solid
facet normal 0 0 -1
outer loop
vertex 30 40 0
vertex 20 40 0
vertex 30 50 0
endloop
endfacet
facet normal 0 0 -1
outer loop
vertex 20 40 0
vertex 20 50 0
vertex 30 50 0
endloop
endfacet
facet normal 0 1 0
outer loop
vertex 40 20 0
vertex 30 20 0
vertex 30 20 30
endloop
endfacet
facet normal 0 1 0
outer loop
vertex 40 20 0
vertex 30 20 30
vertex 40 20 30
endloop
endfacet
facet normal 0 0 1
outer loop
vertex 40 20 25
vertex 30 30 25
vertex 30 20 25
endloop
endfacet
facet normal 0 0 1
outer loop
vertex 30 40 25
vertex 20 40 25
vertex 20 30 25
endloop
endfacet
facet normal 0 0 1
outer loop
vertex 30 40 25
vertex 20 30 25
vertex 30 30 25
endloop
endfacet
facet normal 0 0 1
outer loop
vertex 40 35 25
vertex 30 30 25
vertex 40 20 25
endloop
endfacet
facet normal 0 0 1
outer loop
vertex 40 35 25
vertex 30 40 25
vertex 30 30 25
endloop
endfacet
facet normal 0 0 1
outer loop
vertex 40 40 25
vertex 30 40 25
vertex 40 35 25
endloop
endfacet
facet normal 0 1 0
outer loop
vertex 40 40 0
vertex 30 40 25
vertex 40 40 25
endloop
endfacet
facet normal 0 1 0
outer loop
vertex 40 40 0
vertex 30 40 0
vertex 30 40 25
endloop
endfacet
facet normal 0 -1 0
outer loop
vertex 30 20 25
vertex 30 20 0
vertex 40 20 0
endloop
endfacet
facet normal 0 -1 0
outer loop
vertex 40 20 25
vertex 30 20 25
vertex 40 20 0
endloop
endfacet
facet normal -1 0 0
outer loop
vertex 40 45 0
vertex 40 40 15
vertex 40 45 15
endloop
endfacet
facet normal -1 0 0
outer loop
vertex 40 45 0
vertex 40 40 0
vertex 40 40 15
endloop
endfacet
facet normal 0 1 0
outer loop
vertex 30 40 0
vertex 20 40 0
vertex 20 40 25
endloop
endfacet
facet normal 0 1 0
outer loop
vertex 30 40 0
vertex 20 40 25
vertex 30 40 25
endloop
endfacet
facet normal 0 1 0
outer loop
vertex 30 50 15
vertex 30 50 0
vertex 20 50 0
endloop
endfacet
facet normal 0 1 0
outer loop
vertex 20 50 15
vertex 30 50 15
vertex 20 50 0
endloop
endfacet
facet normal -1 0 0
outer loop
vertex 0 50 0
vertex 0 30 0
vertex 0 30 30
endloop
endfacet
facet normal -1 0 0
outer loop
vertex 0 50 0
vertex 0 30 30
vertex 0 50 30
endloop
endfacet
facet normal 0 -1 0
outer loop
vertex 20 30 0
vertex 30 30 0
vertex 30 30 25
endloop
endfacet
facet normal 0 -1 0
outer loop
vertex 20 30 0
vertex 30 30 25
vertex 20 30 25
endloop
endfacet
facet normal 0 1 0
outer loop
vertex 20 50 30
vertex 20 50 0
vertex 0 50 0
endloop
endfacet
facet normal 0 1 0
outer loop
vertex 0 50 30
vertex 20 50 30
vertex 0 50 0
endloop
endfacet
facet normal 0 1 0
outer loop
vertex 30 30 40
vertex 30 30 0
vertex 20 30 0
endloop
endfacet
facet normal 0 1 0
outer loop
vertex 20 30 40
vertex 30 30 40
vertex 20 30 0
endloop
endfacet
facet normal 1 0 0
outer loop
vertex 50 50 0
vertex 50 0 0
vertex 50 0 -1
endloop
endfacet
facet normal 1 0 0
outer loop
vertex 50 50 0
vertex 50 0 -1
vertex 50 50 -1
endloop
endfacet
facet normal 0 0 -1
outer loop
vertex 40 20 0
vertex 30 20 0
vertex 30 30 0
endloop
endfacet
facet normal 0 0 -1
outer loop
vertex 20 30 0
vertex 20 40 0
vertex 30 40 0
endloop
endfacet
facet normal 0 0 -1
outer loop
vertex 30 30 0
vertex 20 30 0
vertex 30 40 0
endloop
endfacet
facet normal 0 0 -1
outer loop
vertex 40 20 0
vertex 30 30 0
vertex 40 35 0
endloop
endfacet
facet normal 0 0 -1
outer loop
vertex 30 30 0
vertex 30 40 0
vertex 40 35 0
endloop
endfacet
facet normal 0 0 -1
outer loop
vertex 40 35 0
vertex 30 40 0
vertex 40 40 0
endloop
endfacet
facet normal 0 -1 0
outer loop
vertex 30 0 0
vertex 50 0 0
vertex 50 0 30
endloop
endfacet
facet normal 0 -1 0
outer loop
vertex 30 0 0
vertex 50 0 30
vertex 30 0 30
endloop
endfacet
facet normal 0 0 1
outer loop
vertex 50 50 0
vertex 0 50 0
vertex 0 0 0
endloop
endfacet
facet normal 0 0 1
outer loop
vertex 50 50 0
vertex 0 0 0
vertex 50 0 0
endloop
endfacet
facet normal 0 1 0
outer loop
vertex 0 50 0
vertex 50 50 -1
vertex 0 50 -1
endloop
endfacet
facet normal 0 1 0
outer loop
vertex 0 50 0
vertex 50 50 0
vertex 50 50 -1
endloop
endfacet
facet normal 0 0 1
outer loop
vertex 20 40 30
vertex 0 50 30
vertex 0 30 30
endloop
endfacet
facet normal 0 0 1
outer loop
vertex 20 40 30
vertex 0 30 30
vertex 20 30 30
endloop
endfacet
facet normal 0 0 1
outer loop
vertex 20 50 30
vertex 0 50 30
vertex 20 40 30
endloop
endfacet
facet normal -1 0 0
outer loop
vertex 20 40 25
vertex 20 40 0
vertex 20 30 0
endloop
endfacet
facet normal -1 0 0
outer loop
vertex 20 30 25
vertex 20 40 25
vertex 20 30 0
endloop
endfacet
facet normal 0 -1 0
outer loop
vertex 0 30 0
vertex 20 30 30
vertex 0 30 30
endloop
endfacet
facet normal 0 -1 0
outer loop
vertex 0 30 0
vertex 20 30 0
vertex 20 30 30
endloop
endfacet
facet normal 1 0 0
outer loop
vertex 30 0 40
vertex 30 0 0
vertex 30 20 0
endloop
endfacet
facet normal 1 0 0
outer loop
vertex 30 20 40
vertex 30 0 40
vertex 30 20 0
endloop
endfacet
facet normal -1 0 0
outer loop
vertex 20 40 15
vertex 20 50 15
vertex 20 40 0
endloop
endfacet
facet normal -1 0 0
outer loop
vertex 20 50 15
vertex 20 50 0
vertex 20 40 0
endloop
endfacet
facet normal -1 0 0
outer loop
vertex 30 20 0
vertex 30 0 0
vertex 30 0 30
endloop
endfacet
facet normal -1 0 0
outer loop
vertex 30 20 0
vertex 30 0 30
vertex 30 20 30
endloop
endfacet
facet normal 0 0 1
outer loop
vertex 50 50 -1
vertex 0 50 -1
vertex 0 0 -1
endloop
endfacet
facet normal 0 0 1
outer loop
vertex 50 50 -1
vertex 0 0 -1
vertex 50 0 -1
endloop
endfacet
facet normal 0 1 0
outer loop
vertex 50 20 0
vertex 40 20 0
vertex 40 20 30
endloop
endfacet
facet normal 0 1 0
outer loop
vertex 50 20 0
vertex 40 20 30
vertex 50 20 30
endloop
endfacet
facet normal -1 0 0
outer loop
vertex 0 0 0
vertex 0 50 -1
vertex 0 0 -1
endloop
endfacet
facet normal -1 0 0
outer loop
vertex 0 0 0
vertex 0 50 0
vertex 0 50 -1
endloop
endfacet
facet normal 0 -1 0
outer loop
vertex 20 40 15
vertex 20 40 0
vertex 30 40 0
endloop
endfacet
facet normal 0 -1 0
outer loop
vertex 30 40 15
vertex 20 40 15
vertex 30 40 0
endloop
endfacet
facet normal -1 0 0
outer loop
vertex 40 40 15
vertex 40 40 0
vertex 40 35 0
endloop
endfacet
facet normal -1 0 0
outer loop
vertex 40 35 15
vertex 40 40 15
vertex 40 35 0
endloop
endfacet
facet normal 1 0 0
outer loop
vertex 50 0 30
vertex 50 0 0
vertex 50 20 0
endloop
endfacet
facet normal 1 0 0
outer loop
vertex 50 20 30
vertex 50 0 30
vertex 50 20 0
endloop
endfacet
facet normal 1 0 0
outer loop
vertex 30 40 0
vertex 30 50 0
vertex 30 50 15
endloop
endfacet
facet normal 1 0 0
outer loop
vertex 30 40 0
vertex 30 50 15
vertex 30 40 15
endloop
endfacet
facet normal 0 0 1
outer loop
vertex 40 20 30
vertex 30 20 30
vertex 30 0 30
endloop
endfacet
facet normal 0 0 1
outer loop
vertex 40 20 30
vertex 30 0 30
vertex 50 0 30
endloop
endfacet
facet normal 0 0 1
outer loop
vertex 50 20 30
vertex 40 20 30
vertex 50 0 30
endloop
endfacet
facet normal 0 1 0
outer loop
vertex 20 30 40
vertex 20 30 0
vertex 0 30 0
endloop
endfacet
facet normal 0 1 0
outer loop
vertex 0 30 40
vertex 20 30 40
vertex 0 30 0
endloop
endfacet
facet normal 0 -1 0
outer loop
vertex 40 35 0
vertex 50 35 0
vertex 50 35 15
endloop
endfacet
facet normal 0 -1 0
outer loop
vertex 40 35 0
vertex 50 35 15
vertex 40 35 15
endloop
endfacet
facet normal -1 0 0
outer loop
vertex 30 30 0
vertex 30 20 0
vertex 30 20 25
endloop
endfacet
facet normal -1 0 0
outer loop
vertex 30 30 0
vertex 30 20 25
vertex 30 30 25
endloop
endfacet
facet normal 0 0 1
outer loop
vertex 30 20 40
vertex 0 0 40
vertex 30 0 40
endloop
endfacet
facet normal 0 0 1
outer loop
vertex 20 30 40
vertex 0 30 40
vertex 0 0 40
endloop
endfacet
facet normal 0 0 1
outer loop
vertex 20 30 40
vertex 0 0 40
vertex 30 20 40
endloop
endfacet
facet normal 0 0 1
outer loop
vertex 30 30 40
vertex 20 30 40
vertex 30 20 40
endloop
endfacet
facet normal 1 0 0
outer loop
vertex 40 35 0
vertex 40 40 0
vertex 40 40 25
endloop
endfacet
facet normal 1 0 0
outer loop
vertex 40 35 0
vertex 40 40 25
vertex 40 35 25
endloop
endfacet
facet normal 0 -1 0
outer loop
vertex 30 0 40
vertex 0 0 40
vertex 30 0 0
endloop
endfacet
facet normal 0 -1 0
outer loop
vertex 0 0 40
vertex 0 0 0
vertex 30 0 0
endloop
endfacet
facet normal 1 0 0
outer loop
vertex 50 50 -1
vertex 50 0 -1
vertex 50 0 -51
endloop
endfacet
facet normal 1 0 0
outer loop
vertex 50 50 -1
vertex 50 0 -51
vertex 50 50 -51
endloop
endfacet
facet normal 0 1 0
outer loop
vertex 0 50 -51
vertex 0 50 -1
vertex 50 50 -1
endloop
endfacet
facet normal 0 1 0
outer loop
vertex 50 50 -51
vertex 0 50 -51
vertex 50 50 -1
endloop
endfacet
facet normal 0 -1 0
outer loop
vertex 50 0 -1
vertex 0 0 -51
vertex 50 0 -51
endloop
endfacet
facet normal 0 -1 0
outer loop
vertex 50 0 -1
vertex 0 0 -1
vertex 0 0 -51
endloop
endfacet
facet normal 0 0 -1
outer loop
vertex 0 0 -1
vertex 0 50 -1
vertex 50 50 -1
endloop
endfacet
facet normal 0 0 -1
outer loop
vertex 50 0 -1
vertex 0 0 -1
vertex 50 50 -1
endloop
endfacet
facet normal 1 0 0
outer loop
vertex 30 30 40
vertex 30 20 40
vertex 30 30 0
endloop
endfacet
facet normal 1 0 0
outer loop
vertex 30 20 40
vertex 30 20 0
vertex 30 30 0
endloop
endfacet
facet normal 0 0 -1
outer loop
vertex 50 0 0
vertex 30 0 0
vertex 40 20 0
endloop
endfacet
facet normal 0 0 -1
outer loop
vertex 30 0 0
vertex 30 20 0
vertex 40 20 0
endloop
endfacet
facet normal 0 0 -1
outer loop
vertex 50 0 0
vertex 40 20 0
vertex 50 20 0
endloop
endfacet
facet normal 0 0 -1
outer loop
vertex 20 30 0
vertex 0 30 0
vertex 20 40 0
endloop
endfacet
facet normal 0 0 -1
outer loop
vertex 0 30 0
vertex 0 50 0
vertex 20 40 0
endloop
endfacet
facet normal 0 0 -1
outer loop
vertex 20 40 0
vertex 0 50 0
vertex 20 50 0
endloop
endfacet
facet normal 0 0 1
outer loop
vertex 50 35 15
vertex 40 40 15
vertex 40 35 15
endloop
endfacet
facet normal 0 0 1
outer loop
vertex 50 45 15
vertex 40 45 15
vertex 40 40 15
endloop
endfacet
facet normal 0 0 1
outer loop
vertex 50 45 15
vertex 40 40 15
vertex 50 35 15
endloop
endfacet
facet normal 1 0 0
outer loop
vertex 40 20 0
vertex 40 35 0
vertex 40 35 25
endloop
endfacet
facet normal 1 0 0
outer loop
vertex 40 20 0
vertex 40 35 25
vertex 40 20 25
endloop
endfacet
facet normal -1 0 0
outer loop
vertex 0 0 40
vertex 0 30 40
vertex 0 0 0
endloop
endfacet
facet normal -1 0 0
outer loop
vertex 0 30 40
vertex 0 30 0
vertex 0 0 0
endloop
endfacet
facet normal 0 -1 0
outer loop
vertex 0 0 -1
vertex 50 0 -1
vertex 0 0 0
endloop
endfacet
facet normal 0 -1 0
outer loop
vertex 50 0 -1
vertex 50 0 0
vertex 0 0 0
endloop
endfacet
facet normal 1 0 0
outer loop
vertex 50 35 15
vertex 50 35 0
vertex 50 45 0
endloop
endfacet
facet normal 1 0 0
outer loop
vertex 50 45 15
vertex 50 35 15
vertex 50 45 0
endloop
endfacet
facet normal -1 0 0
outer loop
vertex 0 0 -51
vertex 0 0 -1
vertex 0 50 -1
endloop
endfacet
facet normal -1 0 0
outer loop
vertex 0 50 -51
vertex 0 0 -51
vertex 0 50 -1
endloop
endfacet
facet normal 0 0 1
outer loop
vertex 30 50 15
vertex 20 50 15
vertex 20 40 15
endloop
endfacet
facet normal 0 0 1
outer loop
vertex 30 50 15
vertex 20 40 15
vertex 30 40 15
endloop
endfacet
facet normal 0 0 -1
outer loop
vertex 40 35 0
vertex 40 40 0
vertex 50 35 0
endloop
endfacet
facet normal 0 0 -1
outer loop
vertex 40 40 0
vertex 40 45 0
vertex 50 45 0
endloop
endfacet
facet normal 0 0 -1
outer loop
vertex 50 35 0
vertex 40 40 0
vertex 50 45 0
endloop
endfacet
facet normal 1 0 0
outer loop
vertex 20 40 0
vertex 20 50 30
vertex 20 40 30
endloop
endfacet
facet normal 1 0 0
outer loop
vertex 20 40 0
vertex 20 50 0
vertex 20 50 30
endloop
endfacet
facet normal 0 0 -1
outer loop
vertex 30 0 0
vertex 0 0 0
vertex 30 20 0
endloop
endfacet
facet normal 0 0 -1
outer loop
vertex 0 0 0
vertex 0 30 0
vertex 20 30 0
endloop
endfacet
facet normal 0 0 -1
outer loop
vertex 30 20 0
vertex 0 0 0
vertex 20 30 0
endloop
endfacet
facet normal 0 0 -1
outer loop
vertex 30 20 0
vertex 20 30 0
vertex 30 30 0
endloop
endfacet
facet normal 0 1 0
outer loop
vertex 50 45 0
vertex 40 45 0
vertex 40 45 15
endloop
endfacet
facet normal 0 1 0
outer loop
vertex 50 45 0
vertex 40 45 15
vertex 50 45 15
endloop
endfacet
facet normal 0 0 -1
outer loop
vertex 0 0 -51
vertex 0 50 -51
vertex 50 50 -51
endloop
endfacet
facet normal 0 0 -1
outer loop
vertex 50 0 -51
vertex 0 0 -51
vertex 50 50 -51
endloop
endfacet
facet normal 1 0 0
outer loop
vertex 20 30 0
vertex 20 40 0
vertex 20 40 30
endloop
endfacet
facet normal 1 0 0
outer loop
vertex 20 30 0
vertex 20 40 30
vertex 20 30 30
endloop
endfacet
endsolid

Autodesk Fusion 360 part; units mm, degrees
sketch "Skizze1" plane through (0, 0, 0) normal (0, 0, 1) x (1, 0, 0)
  line L0 (0, 0) -> (50, 0) construction
  line L1 (50, 0) -> (50, 50)
  line L2 (50, 50) -> (0, 50)
  line L3 (0, 50) -> (0, 0) construction
  line L4 (0, 0) -> (30, 0)
  line L5 (30, 0) -> (30, 30)
  line L6 (30, 30) -> (0, 30)
  line L7 (0, 30) -> (0, 0)
  line L8 (0, 50) -> (20, 50)
  line L9 (20, 50) -> (20, 30)
  line L10 (20, 30) -> (0, 30)
  line L11 (0, 30) -> (0, 50)
  line L12 (50, 0) -> (30, 0)
  line L13 (30, 0) -> (30, 20)
  line L14 (30, 20) -> (50, 20)
  line L15 (50, 20) -> (50, 0)
  line L16 (20, 40) -> (40, 40)
  line L17 (40, 40) -> (40, 20)
  line L18 (20, 50) -> (30, 50)
  line L19 (30, 50) -> (30, 40)
  line L20 (30, 40) -> (20, 40)
  line L21 (20, 40) -> (20, 50)
  line L22 (40, 45) -> (50, 45)
  line L23 (50, 45) -> (50, 35)
  line L24 (50, 35) -> (40, 35)
  line L25 (40, 35) -> (40, 45)
extrude "Extrusion1" add sketch "Skizze1" along normal blind 40 contours L4 L5 L6 L7 L10 L13 makes body 1 in component "Component"
extrude "Extrusion1'" add sketch "Skizze1" along normal blind 30 separate body contours L1 L5 L12 L13 L14 L15 makes body 2 in component "Medium Block 1"
extrude "Extrusion1''" add sketch "Skizze1" along normal blind 30 separate body contours L2 L6 L8 L9 L10 L11 L21 makes body 3 in component "Medium Block 2#"
extrude "Extrusion1'''" add sketch "Skizze1" along normal blind 25 separate body contours L5 L6 L9 L14 L16 L17 L20 L25 makes body 4 in component "L Block"
extrude "Extrusion1''''" add sketch "Skizze1" along normal blind 15 separate body contours L2 L9 L16 L18 L19 L20 L21 makes body 5 in component "Smal Block 1"
extrude "Extrusion1'''''" add sketch "Skizze1" along normal blind 15 separate body contours L1 L17 L22 L23 L24 L25 makes body 6 in component "Smal Block 2"
extrude "Extrusion1''''''" add sketch "Skizze1" against normal blind 1 separate body makes body 7 in component "Ground"
extrude "Extrusion1'''''''" add 1 faces at (16.6667, 33.3333, -1) along direction (0, 0, -1) blind 50 separate body on bodies 7 makes body 8 in component "Ground below"
component "Component" placed x (1, 0, 0) y (0, 1, 0) z (0, 0, 1) at (0, 0, 0)
component "Medium Block 1" placed x (1, 0, 0) y (0, 1, 0) z (0, 0, 1) at (0, 0, 0)
component "Medium Block 2#" placed x (1, 0, 0) y (0, 1, 0) z (0, 0, 1) at (0, 0, 0)
component "L Block" placed x (1, 0, 0) y (0, 1, 0) z (0, 0, 1) at (0, 0, 0)
component "Smal Block 1" placed x (1, 0, 0) y (0, 1, 0) z (0, 0, 1) at (0, 0, 0)
component "Smal Block 2" placed x (1, 0, 0) y (0, 1, 0) z (0, 0, 1) at (0, 0, 0)
component "Ground" placed x (1, 0, 0) y (0, 1, 0) z (0, 0, 1) at (0, 0, 0)
component "Ground below" placed x (1, 0, 0) y (0, 1, 0) z (0, 0, 1) at (0, 0, 0)
